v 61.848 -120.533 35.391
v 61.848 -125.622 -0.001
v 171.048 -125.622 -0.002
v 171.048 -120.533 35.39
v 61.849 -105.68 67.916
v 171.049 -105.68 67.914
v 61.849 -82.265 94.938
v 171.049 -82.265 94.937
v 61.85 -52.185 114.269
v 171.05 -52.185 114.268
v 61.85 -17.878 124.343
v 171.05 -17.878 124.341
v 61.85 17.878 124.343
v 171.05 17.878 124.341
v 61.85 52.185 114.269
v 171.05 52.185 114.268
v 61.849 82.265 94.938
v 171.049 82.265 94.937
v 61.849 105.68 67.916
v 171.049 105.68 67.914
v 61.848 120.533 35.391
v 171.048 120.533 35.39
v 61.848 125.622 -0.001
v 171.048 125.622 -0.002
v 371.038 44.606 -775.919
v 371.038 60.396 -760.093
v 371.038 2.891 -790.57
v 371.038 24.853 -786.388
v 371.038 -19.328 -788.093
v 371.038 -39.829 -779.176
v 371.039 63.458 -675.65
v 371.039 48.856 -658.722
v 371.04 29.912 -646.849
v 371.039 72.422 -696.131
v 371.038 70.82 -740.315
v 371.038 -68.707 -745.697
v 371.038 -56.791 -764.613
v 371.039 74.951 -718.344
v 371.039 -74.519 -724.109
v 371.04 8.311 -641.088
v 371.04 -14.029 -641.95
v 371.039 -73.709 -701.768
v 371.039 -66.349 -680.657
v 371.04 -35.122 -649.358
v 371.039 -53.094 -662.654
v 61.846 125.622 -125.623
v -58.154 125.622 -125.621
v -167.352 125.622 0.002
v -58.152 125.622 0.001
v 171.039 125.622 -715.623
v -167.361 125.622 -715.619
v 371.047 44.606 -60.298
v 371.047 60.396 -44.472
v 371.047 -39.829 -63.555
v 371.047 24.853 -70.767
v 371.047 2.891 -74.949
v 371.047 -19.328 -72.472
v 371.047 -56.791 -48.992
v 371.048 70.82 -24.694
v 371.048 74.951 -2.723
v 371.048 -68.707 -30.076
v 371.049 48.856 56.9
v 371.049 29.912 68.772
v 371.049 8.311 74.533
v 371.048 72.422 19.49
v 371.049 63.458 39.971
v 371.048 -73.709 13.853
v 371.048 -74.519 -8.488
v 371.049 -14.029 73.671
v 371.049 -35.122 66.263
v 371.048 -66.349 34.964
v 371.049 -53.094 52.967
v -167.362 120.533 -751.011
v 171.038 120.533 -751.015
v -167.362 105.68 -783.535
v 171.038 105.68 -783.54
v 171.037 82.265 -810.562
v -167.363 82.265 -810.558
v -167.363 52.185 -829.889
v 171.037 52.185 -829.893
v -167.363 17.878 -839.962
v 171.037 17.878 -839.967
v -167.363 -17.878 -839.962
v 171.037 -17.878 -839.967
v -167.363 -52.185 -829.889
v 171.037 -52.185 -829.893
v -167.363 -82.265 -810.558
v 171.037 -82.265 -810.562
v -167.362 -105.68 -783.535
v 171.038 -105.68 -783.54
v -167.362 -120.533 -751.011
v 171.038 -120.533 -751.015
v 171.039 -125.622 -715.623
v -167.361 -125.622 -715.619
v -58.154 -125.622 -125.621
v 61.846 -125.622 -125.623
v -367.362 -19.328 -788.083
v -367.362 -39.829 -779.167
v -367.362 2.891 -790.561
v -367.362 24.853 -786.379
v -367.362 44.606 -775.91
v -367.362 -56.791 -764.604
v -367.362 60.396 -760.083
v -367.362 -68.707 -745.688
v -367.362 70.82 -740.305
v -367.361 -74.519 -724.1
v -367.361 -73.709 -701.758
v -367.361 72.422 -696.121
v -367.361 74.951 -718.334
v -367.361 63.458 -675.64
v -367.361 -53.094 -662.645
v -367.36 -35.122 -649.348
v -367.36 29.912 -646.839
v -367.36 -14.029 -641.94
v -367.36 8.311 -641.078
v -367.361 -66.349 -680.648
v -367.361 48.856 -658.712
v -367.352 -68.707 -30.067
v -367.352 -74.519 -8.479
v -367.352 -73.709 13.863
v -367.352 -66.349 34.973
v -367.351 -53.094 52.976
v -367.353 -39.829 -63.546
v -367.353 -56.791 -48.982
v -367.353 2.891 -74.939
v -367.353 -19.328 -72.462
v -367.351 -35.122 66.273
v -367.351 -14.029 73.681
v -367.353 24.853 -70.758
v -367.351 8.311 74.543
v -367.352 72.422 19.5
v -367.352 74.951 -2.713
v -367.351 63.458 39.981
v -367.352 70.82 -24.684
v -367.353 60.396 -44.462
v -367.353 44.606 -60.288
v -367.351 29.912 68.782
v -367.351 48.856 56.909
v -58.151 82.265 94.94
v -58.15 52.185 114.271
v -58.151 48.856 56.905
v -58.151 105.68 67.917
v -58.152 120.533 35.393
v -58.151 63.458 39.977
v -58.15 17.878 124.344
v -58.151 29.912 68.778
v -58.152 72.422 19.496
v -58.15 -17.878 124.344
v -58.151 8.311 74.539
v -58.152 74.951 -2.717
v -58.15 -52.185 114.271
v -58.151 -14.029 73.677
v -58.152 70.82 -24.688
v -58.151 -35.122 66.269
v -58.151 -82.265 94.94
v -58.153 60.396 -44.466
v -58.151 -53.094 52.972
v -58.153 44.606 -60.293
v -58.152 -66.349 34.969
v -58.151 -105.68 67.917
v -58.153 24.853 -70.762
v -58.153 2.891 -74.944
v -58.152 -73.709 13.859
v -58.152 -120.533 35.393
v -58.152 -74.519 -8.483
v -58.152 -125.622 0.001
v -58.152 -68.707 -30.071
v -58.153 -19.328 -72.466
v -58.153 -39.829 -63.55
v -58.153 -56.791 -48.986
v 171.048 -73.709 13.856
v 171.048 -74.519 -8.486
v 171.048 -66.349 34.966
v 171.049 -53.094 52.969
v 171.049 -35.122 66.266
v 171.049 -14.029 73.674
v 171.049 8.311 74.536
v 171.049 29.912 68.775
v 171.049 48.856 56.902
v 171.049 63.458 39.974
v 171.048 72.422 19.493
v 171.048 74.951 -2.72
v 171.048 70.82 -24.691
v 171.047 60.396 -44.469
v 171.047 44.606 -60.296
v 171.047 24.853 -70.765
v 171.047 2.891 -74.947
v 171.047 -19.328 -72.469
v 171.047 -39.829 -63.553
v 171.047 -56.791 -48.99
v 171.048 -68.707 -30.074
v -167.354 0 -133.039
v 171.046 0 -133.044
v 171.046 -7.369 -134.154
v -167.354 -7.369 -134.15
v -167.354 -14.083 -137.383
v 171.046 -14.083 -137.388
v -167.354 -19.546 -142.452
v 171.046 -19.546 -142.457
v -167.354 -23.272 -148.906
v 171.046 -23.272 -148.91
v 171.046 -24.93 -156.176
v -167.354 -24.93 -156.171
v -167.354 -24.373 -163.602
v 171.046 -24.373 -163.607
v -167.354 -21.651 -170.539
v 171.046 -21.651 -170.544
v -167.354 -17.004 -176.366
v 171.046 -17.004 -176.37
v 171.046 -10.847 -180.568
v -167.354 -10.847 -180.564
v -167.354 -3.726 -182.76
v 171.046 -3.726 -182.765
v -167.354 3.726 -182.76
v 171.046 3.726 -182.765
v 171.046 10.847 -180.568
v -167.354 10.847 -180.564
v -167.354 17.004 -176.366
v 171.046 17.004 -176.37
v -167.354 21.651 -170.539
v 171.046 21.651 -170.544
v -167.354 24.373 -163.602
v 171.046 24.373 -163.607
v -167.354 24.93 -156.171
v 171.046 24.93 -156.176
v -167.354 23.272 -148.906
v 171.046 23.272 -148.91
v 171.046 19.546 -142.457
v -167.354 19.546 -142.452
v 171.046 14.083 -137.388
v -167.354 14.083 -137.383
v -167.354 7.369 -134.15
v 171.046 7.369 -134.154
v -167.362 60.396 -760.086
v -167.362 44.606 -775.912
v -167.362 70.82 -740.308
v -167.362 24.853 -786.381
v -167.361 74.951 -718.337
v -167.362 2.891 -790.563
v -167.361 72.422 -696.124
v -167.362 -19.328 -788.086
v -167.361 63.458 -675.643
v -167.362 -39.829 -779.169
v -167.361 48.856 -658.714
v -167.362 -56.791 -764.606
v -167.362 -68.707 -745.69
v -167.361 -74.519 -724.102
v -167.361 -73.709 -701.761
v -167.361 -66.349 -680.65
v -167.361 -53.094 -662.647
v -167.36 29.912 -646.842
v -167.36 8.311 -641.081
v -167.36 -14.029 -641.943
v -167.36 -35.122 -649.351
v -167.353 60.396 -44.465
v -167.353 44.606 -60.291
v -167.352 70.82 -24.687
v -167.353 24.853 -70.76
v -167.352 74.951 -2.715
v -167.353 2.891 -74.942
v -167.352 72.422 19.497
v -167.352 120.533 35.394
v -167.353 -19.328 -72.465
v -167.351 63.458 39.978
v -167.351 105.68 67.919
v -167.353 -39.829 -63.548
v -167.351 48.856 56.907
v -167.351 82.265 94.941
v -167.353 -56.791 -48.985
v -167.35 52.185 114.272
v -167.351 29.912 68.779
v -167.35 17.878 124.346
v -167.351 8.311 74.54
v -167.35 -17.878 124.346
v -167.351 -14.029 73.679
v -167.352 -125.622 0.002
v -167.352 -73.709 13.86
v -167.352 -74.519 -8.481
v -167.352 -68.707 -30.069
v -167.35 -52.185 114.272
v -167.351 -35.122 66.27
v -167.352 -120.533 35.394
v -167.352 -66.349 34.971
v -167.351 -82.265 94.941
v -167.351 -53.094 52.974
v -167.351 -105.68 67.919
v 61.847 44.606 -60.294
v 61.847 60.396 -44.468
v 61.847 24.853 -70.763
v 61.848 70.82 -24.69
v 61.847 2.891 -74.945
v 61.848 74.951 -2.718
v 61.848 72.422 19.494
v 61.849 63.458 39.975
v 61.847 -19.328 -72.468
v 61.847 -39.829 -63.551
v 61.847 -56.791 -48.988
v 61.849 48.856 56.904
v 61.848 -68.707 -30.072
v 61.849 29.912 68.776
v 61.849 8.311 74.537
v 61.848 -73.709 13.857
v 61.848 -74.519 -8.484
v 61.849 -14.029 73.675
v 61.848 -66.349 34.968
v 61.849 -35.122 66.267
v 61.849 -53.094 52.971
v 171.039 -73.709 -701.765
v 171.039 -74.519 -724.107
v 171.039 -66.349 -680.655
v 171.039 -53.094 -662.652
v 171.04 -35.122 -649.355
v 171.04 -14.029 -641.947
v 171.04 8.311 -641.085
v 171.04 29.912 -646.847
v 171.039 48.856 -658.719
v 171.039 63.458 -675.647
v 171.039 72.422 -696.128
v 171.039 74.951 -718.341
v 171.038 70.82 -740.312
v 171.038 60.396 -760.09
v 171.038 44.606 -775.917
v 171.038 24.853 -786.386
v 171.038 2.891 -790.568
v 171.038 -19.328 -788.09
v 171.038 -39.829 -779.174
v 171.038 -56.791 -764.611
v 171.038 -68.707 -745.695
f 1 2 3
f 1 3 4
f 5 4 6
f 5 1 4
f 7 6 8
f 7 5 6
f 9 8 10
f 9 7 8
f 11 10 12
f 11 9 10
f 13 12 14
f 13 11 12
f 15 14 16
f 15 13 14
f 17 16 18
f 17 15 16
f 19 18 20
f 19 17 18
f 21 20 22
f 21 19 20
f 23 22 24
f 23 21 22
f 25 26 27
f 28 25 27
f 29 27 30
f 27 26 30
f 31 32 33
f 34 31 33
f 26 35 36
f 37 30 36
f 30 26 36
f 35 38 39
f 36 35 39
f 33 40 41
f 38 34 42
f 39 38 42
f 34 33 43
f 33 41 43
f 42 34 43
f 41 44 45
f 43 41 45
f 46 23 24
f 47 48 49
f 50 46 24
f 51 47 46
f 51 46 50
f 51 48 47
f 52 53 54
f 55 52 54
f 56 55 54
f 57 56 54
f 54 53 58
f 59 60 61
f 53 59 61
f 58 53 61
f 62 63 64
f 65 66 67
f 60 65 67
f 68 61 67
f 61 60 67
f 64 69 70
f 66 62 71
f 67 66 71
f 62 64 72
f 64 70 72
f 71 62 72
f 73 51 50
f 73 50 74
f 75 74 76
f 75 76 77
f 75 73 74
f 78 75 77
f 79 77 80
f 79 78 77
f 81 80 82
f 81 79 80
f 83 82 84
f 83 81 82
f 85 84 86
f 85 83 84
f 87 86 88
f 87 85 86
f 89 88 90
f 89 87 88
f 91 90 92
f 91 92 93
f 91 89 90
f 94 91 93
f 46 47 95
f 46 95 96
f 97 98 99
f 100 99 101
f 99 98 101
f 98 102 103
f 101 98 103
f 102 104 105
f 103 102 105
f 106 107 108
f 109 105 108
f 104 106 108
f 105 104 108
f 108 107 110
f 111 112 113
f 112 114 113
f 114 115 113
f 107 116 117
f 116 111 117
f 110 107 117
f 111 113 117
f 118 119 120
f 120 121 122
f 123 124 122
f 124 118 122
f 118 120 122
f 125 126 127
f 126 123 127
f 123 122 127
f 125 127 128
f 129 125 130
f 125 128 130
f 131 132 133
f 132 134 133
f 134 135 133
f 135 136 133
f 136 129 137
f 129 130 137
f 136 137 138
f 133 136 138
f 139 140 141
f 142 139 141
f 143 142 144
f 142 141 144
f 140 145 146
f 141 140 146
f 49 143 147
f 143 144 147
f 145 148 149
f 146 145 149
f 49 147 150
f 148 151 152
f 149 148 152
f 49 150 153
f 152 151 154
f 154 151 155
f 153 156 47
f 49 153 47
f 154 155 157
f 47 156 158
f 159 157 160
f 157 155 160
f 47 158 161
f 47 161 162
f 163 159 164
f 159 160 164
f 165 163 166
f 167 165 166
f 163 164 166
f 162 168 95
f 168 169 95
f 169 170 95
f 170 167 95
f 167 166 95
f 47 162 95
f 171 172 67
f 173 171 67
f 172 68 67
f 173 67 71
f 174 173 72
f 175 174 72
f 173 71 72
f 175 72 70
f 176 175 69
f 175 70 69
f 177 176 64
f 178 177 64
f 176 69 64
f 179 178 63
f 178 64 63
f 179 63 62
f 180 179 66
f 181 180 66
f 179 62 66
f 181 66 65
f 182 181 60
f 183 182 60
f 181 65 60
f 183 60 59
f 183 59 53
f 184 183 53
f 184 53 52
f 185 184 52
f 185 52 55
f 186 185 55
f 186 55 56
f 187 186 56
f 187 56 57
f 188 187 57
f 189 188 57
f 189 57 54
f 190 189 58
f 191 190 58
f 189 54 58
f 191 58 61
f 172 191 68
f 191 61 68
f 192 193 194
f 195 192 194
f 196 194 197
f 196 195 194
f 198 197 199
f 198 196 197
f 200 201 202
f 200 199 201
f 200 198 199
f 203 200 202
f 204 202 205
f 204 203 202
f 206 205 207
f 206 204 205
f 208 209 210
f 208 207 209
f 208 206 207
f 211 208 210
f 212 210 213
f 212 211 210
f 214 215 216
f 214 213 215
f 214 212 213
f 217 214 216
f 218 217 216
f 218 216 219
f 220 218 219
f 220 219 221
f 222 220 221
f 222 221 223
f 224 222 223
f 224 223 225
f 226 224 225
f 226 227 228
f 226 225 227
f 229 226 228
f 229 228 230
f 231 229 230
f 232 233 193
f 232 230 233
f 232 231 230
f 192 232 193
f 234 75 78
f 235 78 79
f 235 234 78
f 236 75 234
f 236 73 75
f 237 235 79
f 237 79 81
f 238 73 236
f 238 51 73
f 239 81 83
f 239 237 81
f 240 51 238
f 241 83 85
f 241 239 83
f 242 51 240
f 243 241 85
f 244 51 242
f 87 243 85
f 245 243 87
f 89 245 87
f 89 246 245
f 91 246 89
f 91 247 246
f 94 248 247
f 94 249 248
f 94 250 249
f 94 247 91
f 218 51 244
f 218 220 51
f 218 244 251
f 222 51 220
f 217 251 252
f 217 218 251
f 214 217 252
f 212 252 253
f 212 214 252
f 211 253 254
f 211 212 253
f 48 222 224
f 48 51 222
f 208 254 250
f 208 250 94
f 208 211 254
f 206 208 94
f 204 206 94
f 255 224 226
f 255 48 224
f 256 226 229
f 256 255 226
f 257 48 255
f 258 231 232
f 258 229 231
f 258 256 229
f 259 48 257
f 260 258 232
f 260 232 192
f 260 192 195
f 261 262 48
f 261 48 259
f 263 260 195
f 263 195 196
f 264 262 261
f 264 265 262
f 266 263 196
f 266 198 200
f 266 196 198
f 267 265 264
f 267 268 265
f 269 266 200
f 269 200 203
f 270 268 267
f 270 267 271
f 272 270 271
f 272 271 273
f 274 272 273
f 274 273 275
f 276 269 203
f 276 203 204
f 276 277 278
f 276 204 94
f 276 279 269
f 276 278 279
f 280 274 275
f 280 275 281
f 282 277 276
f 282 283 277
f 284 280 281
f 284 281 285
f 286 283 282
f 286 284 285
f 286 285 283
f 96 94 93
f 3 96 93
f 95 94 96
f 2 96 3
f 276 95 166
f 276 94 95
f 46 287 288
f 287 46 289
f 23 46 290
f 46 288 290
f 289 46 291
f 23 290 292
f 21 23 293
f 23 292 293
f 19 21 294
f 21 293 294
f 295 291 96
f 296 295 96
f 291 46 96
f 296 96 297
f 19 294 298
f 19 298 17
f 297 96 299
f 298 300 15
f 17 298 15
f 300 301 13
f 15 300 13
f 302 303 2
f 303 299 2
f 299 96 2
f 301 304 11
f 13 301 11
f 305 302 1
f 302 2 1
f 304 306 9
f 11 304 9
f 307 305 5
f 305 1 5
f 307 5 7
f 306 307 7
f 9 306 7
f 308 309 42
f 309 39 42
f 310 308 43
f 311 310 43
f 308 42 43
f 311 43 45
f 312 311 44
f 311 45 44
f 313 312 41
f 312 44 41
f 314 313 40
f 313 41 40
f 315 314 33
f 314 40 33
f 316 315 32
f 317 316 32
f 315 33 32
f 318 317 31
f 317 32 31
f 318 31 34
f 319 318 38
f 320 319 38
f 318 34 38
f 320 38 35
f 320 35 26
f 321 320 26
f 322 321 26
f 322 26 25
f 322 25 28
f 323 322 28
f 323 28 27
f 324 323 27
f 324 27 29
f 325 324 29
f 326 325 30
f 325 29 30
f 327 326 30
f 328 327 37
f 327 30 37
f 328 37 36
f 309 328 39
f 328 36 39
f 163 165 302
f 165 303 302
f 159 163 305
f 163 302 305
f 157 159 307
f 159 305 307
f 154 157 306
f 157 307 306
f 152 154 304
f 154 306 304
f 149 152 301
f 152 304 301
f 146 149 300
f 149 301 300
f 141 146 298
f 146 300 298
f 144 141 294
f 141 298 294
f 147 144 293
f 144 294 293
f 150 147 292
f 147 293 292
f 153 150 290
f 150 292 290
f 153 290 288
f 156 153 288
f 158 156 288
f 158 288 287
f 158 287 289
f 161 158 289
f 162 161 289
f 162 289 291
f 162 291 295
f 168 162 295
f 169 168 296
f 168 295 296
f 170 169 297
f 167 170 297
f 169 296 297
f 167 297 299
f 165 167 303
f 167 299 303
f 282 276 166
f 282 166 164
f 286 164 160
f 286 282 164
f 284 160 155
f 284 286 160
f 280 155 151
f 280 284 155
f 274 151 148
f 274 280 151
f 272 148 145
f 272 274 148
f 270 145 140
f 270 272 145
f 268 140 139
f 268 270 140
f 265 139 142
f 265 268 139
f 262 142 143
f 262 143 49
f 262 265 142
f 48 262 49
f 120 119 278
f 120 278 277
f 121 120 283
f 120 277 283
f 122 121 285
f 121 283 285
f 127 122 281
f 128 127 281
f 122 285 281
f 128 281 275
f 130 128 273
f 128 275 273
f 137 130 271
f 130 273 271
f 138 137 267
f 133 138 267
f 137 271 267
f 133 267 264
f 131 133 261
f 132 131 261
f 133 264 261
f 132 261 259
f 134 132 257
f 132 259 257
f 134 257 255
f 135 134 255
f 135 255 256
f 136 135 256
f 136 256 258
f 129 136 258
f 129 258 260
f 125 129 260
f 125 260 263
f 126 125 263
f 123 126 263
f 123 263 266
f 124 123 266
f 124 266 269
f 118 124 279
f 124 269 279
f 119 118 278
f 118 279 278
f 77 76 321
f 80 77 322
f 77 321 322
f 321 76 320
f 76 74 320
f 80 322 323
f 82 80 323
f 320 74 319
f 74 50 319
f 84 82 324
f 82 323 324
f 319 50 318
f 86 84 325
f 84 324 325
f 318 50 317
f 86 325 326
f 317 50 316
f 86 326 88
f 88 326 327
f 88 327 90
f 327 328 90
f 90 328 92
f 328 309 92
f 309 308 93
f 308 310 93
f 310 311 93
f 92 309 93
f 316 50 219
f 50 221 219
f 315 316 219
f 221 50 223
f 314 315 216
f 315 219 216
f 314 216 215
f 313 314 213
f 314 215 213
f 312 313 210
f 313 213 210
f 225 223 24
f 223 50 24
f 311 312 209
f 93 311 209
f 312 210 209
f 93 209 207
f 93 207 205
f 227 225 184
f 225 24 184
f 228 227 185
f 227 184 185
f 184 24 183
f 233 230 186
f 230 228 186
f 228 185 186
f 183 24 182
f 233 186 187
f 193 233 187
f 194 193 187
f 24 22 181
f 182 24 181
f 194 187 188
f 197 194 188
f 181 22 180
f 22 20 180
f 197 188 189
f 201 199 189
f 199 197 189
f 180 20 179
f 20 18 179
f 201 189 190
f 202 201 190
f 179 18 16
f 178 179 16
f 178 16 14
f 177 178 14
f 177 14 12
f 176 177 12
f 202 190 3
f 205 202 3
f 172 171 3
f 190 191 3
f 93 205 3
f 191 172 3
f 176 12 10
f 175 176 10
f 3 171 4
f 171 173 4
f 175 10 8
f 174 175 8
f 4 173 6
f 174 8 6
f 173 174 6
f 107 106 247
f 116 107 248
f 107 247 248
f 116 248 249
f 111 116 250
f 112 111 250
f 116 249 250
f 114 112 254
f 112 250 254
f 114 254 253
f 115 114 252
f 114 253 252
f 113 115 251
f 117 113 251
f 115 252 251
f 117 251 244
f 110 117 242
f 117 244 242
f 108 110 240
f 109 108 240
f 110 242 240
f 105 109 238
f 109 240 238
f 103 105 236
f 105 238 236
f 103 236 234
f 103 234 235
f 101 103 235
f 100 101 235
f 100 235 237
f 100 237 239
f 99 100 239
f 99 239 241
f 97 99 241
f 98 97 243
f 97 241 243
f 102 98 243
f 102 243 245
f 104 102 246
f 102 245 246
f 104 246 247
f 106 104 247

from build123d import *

# Parameters (mm, degrees)
BOSS_EXTRUDE1_DEPTH     = 338.4
CUT_EXTRUDE1_DEPTH      = 4078.516360054
BODY_MOVE_COPY1_ANGLE   = 6.4948363
CUT_EXTRUDE2_DEPTH      = 1007.656101098
CUT_EXTRUDE2_DEPTH_BACK = 1007.656101098
SKETCH8_R               = 25


with BuildPart() as part:
    # Sketch1 → Boss-Extrude1 (new body)
    with BuildSketch(Plane(origin=(-169.199995481, 0.039105561, 0), x_dir=(-0.00023112033831648726, -0.9999999732916943, 0), z_dir=(-0.9999999732916943, 0.00023112033831648726, -9.983680815562587e-14))):
        with BuildLine():
            Line((-8457.49603755, 2990.648405965), (-8376.54968012, 2279.62014296))
            ThreePointArc((-8376.54968012, 2279.62014296), (-8237.524375906, 2169.013910965), (-8126.918143911, 2308.039215179))
            Line((-8126.918143911, 2308.039215179), (-8207.864501341, 3019.067478184))
            ThreePointArc((-8207.864501341, 3019.067478184), (-8346.889805555, 3129.673710179), (-8457.49603755, 2990.648405965))
        make_face()
    extrude(amount=-BOSS_EXTRUDE1_DEPTH)

    # Sketch2 → Cut-Extrude1 (cut, through all)
    with BuildSketch(Plane(origin=(1.794312536, 7763.54214826, -883.833325812), x_dir=(0.9999999736334177, -0.00022816323452923984, 2.597503388930373e-05), z_dir=(-0.0002296370265797643, -0.9935820538684025, 0.11311343641443838))):
        Polygon((60.107789667, 4123.109536872), (-59.892210195, 4123.11267401), (-59.900592157, 3802.490672498), (60.099407705, 3802.48753536), align=None)
    extrude(amount=-CUT_EXTRUDE1_DEPTH, mode=Mode.SUBTRACT)

    # Sketch3 → Revolve1 (revolve)
    with BuildSketch(Plane(origin=(2e-09, 0, 3004.857942074), x_dir=(-1, 0, 0), z_dir=(0, 0, -1)), mode=Mode.PRIVATE) as revolve1_sk:
        Polygon((-61.943184257, 8407.666177671), (-61.925850231, 8332.666179674), (58.07414647, 8332.693914114), (58.056812444, 8407.693912112), align=None)
    revolve(revolve1_sk.sketch.rotate(Axis((61.925850233, 8332.666179674, 3004.857942074), (-0.9999999732916957, 0.0002311203324015103, 5.403085390737201e-13)), 180), axis=Axis((61.925850233, 8332.666179674, 3004.857942074), (-0.9999999732916957, 0.0002311203324015103, 5.403085390737201e-13)))

    # Sketch4 → Revolve2 (revolve)
    with BuildSketch(Plane(origin=(1e-09, 0, 2293.82967907), x_dir=(-1, 0, 0), z_dir=(0, 0, -1)), mode=Mode.PRIVATE) as revolve2_sk:
        Polygon((-371.124467697, 8326.648359994), (-371.107133671, 8251.648361997), (-171.107139013, 8251.694586065), (-171.124473038, 8326.694584062), align=None)
    revolve(revolve2_sk.sketch.rotate(Axis((371.107122989, 8251.648361999, 2293.829679069), (-0.9999999732916943, 0.0002311203383076049, 5.395684476116649e-13)), 180), axis=Axis((371.107122989, 8251.648361999, 2293.829679069), (-0.9999999732916943, 0.0002311203383076049, 5.395684476116649e-13)))

    # Sketch5 → Revolve3 (revolve)
    with BuildSketch(Plane(origin=(2e-09, 0, 3004.857942074), x_dir=(-1, 0, 0), z_dir=(0, 0, -1)), mode=Mode.PRIVATE) as revolve3_sk:
        Polygon((-371.143176046, 8407.594715262), (-371.12584202, 8332.594717265), (-171.125847362, 8332.640941332), (-171.143181387, 8407.640939329), align=None)
    revolve(revolve3_sk.sketch.rotate(Axis((371.125831339, 8332.594717267, 3004.857942074), (-0.9999999732916943, 0.00023112033830760464, 5.395684476116643e-13)), 180), axis=Axis((371.125831339, 8332.594717267, 3004.857942074), (-0.9999999732916943, 0.00023112033830760464, 5.395684476116643e-13)))

    # Sketch6 → Revolve4 (revolve)
    with BuildSketch(Plane(origin=(1e-09, 0, 2293.82967907), x_dir=(-1, 0, 0), z_dir=(0, 0, -1)), mode=Mode.PRIVATE) as revolve4_sk:
        Polygon((167.275517924, 8326.772795184), (167.292851949, 8251.772797187), (367.292846607, 8251.819021255), (367.275512582, 8326.819019252), align=None)
    revolve(revolve4_sk.sketch.rotate(Axis((-167.292862631, 8251.77279719, 2293.82967907), (-0.9999999732916943, 0.00023112033831648596, 5.41788893898131e-13)), 180), axis=Axis((-167.292862631, 8251.77279719, 2293.82967907), (-0.9999999732916943, 0.00023112033831648596, 5.41788893898131e-13)))

    # Sketch7 → Revolve5 (revolve)
    with BuildSketch(Plane(origin=(2e-09, 0, 3004.857942074), x_dir=(-1, 0, 0), z_dir=(0, 0, -1)), mode=Mode.PRIVATE) as revolve5_sk:
        Polygon((167.256809575, 8407.719150452), (167.2741436, 8332.719152455), (367.274138258, 8332.765376523), (367.256804233, 8407.765374519), align=None)
    revolve(revolve5_sk.sketch.rotate(Axis((-167.274154282, 8332.719152457, 3004.857942075), (-0.9999999732916943, 0.00023112033831648528, 5.417888938981294e-13)), 180), axis=Axis((-167.274154282, 8332.719152457, 3004.857942075), (-0.9999999732916943, 0.00023112033831648528, 5.417888938981294e-13)))


with BuildPart() as part_1:
    # Body-Move/Copy1: read off the stored shape, not the designer's step
    # Body-Move/Copy1: moved
    add(part.part.moved(Location((1.8963, 208.8730906, -934.0697721))).rotate(Axis((0, 0, 0), (0.9999979393, 0, 0.0020301439)), BODY_MOVE_COPY1_ANGLE))


with BuildPart() as part_2:
    # Body-Move/Copy2: read off the stored shape, not the designer's step
    # Body-Move/Copy2: moved
    add(part_1.part.moved(Location((-0.0396508, -8252.5008213, -3023.6625196))))

    # Sketch8 → Cut-Extrude2 (cut, two sides: drawn at the far end of the back side and taken through both)
    with BuildSketch(Plane(origin=(171.048025075, 0, -0.002243036), x_dir=(-1.311348857824843e-05, 0, -0.9999999999140183), z_dir=(0.9999999999140183, 0, -1.311348857824843e-05)).offset(-CUT_EXTRUDE2_DEPTH_BACK)):
        with Locations(Location((158.041542403, 0, 0), (0, 0, 180))):
            Circle(SKETCH8_R)
    extrude(amount=CUT_EXTRUDE2_DEPTH + CUT_EXTRUDE2_DEPTH_BACK, mode=Mode.SUBTRACT)


solid = part_2.part
